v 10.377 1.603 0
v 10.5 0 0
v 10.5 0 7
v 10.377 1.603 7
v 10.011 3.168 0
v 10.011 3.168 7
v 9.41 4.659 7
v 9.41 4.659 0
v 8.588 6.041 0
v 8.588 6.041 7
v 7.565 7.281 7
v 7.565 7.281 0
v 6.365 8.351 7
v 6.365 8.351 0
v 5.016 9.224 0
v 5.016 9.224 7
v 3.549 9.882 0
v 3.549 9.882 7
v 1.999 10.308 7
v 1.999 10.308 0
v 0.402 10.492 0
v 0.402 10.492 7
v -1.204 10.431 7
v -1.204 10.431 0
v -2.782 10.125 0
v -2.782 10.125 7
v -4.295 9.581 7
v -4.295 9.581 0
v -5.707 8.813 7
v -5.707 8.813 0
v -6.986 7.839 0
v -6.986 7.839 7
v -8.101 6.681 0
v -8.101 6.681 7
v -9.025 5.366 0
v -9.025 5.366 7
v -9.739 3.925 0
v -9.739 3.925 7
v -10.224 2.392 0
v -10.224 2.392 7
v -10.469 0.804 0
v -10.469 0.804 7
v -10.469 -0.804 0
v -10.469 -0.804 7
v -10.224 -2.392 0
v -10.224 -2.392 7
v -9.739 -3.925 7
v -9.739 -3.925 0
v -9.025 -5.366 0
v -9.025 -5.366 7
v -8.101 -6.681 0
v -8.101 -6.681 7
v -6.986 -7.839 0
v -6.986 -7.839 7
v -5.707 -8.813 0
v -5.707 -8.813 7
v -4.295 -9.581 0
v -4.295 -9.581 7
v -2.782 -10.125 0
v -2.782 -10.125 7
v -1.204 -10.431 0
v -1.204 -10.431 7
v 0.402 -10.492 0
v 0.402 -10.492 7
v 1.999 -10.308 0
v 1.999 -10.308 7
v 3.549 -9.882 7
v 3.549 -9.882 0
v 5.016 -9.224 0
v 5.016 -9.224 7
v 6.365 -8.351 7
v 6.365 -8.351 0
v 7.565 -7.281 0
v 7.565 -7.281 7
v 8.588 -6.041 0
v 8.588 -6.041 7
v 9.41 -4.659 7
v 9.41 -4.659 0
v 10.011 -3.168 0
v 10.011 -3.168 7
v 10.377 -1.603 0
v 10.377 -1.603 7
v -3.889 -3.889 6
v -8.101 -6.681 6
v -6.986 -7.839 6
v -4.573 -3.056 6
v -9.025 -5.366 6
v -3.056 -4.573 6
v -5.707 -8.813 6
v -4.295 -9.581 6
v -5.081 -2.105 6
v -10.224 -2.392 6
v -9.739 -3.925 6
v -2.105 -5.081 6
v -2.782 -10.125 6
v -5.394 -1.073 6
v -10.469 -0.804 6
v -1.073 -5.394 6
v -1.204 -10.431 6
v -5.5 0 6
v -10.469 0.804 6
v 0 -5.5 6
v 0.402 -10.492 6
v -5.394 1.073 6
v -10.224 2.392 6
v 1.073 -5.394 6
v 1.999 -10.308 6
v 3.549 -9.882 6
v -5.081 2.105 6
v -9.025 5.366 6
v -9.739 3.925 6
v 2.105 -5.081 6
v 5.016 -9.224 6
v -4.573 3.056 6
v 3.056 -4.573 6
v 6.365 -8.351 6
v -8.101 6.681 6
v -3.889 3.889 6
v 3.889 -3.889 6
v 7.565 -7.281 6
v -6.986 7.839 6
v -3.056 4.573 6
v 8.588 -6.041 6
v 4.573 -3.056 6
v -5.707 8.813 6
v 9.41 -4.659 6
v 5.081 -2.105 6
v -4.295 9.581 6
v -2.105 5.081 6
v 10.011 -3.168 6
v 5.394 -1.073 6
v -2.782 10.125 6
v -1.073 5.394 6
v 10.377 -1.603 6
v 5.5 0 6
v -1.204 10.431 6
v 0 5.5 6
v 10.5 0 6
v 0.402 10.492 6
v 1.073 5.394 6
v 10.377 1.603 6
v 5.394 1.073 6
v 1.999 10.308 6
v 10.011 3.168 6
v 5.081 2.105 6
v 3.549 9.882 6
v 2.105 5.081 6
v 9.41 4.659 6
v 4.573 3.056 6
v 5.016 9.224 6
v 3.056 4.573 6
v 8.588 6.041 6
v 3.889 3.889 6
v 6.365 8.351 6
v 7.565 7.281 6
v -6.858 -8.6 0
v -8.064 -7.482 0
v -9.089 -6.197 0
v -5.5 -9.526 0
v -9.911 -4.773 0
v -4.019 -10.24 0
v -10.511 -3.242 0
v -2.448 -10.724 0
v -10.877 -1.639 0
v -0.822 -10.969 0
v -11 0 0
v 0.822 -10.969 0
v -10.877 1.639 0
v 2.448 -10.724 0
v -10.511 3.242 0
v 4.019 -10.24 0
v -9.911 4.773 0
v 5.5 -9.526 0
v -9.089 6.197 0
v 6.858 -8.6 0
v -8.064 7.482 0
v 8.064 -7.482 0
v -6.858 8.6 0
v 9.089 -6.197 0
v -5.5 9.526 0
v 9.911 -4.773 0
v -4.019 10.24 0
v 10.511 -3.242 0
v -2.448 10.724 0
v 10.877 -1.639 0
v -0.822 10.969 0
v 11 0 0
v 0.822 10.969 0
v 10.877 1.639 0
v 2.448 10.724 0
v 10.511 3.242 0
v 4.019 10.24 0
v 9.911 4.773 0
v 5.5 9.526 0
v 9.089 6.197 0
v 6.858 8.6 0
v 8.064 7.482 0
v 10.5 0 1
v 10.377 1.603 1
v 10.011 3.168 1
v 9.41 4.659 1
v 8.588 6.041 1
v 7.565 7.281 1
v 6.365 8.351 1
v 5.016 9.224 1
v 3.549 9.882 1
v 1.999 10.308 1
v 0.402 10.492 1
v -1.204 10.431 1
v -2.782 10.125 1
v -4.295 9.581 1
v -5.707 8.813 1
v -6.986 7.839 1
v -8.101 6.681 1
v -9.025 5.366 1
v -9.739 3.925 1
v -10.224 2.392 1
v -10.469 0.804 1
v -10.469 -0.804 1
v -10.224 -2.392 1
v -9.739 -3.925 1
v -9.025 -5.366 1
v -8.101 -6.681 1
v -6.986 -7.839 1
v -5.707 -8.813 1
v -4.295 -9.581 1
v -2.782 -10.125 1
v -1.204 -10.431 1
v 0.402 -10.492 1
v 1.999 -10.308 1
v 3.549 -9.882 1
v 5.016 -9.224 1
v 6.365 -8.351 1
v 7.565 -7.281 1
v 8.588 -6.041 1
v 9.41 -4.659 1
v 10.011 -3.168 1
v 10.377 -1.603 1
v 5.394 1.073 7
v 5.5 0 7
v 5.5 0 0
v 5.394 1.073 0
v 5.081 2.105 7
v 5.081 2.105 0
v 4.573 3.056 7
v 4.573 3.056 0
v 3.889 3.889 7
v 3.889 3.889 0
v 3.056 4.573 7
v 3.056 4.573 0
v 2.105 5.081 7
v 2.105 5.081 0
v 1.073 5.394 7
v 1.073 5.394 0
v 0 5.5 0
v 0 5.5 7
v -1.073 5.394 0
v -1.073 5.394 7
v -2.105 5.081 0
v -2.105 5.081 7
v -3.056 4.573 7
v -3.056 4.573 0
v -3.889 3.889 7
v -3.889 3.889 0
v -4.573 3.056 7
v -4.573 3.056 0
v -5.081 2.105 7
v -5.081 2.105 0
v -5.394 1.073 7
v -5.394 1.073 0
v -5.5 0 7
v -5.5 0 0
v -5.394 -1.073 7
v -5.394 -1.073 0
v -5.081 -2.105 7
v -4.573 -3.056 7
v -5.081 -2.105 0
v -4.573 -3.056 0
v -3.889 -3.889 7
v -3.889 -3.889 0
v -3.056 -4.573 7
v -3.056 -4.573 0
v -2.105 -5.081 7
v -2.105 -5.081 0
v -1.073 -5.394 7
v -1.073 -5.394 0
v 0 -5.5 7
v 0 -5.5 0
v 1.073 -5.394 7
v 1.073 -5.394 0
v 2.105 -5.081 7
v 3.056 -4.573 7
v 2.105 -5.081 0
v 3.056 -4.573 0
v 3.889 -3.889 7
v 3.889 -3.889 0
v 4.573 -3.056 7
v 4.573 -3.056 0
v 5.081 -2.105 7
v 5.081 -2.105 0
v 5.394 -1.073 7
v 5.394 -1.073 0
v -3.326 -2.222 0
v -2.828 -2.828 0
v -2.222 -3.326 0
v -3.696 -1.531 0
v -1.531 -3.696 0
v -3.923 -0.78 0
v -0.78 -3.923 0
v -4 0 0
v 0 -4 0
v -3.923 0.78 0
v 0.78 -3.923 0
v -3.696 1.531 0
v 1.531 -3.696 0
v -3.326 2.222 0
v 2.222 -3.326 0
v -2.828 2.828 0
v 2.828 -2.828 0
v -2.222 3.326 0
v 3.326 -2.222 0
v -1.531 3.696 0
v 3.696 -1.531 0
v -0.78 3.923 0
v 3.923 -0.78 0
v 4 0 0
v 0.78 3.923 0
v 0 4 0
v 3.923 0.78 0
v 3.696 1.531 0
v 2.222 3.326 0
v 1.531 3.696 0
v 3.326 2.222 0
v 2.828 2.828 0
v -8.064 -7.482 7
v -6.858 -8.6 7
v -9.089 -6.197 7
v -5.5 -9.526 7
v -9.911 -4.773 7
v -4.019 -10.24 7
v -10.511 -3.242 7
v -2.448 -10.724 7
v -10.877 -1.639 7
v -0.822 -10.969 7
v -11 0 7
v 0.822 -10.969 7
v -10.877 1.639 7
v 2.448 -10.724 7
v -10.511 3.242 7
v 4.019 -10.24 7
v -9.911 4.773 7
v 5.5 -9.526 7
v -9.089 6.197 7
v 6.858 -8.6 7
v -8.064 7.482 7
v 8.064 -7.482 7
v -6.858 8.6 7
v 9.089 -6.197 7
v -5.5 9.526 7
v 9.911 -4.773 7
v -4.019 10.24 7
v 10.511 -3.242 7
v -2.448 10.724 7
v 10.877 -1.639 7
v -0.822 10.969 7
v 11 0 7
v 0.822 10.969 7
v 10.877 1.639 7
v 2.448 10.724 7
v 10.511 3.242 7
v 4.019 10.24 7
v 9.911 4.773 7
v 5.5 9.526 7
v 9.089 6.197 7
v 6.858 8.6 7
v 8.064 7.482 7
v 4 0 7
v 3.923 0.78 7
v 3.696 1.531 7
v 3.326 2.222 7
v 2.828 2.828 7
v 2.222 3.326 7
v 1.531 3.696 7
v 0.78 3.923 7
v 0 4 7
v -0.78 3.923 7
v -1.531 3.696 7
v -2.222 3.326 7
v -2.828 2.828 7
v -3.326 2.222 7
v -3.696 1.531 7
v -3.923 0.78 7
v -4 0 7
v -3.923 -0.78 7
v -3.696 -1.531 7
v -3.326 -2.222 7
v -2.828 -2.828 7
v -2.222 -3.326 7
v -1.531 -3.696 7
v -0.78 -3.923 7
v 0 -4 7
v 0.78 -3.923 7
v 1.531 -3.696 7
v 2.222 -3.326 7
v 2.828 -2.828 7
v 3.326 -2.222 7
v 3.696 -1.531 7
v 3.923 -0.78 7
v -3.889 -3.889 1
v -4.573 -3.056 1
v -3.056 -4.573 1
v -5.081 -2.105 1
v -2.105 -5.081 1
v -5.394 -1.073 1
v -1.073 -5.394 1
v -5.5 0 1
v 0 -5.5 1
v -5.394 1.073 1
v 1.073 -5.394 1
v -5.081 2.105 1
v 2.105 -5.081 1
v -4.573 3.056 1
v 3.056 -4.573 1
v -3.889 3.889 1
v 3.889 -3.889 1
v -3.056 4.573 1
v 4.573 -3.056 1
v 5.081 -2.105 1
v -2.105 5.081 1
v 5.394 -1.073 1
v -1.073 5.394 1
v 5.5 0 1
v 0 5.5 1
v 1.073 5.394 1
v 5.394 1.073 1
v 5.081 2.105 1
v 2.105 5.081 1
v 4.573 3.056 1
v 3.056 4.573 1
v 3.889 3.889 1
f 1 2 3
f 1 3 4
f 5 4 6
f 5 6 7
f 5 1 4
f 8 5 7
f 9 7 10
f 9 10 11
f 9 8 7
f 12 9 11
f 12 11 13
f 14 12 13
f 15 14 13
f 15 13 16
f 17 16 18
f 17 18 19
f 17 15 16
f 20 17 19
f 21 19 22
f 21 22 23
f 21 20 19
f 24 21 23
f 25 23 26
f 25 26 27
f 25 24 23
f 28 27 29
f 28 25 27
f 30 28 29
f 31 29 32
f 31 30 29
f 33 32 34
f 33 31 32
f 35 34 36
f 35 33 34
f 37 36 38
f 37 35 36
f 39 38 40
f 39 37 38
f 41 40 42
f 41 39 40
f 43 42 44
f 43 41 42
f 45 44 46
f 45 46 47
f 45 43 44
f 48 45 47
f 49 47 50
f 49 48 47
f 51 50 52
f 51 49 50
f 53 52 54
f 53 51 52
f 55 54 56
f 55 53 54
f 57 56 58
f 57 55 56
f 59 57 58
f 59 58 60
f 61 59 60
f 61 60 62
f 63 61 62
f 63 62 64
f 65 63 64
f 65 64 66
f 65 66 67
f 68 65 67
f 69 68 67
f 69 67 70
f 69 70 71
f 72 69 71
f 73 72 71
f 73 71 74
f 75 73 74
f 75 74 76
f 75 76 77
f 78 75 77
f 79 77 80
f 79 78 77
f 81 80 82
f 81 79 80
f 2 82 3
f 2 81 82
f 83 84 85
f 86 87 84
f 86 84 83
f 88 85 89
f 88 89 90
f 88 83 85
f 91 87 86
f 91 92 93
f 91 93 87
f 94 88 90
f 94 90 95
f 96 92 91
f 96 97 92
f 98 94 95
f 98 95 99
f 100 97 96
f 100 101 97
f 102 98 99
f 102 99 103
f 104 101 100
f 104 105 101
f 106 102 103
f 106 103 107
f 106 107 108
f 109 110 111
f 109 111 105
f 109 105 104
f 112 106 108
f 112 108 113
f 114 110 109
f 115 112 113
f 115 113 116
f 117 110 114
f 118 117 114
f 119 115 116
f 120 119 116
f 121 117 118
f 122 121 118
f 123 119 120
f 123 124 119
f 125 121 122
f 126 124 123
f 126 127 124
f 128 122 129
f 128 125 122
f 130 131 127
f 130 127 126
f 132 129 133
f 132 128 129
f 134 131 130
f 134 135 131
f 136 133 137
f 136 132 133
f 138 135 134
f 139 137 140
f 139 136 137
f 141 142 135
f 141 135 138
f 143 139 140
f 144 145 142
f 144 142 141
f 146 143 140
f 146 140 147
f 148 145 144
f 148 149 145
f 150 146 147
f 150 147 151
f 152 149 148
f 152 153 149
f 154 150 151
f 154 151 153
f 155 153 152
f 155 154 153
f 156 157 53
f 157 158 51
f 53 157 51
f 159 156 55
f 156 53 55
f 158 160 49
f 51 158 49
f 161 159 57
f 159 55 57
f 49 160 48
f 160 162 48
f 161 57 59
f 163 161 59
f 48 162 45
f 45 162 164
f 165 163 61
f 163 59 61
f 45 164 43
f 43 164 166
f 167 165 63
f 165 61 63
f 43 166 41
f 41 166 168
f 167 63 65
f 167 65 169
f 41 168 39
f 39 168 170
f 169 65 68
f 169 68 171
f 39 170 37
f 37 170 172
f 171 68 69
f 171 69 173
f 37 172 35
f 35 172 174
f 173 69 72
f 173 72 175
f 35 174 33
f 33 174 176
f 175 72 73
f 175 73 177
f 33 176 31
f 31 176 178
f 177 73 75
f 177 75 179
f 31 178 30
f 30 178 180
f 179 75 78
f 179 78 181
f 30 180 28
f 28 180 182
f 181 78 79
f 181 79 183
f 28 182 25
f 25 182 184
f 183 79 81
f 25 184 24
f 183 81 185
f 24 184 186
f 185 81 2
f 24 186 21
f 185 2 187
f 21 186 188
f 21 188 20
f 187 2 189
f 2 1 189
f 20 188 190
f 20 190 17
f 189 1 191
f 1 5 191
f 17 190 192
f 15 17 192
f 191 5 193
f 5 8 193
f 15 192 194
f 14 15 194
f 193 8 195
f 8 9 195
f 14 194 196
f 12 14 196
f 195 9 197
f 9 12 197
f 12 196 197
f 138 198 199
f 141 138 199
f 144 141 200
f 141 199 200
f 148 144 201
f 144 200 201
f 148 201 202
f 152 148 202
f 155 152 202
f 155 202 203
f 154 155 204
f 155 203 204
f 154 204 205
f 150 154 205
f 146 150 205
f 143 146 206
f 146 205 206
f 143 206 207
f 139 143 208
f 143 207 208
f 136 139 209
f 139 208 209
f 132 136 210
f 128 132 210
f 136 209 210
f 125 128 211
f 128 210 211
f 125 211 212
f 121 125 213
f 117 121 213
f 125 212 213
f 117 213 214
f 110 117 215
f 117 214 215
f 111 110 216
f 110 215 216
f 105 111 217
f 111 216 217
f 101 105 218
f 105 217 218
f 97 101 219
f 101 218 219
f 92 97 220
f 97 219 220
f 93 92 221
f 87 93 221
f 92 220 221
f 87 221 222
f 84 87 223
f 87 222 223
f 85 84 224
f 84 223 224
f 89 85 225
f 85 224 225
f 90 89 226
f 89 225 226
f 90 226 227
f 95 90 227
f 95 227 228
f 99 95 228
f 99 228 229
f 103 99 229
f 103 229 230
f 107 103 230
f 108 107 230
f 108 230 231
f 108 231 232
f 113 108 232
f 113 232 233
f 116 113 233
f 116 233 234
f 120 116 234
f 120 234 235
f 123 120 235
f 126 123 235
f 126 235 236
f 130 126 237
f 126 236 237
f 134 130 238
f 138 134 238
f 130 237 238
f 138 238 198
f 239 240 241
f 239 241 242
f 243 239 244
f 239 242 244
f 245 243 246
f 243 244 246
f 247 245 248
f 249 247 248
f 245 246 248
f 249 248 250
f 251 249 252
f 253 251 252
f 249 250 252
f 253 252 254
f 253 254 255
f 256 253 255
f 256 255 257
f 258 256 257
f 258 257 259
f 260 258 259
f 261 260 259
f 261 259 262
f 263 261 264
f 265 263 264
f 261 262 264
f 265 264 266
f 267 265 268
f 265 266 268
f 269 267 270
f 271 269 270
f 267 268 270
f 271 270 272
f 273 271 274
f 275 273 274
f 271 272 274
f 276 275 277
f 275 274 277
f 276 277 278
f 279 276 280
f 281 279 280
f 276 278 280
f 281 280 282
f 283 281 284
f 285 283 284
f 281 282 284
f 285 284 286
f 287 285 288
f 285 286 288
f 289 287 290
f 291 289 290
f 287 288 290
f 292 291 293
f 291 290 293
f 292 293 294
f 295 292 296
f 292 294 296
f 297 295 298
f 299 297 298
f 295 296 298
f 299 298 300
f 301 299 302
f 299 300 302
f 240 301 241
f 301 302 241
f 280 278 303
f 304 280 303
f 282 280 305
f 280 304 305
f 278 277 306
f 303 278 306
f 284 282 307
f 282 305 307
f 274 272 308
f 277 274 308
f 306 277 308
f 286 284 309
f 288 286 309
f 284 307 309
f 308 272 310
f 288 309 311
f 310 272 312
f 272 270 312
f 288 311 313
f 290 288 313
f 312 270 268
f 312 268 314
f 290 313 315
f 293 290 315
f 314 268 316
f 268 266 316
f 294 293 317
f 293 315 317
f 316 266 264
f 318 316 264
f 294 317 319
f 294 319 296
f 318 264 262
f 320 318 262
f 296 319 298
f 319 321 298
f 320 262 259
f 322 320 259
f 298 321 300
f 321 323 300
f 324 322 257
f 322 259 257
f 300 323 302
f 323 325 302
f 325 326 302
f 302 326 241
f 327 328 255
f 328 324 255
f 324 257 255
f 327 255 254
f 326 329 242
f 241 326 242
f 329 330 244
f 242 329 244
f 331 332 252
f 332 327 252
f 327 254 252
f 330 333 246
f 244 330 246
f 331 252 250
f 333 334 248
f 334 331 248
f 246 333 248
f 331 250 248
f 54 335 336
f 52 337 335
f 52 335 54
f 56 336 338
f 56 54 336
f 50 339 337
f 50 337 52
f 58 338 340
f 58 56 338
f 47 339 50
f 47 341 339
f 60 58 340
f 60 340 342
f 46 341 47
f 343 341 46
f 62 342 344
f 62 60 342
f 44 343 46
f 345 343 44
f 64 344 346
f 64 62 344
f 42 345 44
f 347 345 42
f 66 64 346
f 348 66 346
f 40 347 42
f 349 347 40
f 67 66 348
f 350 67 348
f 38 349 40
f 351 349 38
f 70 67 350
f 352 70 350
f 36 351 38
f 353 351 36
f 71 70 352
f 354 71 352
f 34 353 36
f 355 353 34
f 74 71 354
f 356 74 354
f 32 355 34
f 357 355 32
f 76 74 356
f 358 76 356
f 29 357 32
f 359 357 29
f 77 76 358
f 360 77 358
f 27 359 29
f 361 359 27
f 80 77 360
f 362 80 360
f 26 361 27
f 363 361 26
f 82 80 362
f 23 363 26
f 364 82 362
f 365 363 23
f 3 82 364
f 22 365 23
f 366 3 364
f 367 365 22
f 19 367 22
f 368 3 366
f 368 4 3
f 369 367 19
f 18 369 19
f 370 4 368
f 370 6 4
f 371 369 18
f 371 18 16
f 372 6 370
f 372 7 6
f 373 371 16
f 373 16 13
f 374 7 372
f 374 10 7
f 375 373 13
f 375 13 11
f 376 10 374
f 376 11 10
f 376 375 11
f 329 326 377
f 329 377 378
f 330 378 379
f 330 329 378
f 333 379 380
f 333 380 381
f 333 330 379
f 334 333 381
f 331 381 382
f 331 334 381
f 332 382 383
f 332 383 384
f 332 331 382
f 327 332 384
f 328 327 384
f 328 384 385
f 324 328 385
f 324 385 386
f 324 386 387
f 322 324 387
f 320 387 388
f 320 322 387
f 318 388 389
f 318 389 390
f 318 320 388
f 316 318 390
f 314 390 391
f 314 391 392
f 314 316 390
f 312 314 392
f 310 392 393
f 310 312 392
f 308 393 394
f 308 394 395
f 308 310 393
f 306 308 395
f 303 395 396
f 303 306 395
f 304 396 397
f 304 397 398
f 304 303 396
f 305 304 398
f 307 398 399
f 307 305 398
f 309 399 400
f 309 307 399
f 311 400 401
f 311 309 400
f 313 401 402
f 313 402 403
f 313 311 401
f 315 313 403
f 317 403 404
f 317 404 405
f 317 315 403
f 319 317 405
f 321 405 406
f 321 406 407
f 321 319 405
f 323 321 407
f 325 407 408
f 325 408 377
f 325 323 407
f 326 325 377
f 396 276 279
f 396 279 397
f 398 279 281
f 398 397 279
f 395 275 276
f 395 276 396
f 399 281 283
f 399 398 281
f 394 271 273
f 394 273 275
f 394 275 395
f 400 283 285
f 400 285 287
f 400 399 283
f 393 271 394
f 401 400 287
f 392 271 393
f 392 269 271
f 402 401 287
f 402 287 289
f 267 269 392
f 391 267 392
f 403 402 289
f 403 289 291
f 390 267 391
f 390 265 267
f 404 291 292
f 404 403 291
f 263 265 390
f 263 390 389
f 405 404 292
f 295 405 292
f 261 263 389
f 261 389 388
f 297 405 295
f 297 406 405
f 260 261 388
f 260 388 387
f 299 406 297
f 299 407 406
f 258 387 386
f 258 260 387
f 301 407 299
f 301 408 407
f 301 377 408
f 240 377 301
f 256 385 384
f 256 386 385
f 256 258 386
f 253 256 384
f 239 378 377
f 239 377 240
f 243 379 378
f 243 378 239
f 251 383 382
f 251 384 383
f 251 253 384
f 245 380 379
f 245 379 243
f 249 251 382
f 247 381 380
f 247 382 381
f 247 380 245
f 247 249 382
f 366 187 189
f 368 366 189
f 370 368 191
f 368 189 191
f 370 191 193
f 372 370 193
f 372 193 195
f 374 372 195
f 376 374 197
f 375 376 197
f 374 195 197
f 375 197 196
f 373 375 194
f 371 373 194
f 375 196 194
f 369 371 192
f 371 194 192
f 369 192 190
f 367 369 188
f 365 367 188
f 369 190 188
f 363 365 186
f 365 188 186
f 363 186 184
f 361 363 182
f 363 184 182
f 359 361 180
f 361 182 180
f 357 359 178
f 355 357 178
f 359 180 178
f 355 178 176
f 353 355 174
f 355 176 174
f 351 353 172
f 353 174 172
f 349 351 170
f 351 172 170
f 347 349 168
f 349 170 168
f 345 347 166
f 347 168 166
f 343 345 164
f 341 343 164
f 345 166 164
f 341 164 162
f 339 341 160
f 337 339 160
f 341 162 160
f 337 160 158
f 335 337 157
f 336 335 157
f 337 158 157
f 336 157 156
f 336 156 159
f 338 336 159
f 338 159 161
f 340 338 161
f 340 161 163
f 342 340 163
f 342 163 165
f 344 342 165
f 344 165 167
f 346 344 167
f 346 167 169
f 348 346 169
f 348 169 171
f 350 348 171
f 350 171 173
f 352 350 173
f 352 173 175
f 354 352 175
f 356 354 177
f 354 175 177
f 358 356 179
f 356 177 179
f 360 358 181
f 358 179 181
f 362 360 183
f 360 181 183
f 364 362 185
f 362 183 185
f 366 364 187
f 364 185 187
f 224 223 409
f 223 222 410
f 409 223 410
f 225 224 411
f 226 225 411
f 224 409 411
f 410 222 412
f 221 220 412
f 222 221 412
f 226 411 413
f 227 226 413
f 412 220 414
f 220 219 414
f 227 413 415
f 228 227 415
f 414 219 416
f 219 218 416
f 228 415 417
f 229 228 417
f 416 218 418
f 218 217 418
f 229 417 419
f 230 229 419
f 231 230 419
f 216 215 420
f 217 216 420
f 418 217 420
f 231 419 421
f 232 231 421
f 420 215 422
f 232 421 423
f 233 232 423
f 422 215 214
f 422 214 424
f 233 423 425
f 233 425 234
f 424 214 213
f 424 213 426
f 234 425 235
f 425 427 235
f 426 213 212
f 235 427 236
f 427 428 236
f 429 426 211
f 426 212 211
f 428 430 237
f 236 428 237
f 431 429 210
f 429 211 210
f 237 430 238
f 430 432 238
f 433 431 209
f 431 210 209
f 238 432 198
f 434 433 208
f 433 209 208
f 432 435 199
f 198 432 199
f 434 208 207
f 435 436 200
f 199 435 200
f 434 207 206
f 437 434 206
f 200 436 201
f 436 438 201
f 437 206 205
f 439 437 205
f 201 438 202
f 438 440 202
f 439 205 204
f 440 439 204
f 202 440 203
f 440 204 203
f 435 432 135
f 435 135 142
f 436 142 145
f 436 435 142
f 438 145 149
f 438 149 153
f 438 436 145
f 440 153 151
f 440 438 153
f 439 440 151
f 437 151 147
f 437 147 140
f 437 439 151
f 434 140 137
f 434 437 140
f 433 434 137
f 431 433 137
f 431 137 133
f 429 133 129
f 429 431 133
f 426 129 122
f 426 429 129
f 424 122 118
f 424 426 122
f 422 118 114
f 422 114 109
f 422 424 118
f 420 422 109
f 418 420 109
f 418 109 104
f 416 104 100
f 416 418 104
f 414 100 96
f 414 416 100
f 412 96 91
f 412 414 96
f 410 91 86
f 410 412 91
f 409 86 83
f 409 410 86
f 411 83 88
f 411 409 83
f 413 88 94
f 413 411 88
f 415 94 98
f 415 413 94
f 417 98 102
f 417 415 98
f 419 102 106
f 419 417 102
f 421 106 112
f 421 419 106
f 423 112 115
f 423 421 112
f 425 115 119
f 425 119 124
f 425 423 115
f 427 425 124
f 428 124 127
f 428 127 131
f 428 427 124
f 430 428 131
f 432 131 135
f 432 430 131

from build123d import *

# Parameters (mm, degrees)
F0_R     = 5.5
F0_R_2   = 4
F1_DEPTH = 7
F0_R_3   = 11
F0_R_4   = 10.5
F2_DEPTH = 5


with BuildPart() as f1:
    # F0 (on Top) → F1 (new body)
    with BuildSketch(Plane.XY):
        Circle(F0_R)
        Circle(F0_R_2, mode=Mode.SUBTRACT)
    extrude(amount=F1_DEPTH)


with BuildPart() as f1b:
    # F0 (on Top) → F1, piece 2 (new body)
    with BuildSketch(Plane.XY):
        Circle(F0_R_3)
        Circle(F0_R_4, mode=Mode.SUBTRACT)
    extrude(amount=F1_DEPTH)


with BuildPart() as f2:
    # F0 (on Top) → F2 (new body)
    with BuildSketch(Plane.XY):
        Circle(F0_R_4)
        Circle(F0_R, mode=Mode.SUBTRACT)
    extrude(amount=F2_DEPTH)


with BuildPart() as f2_1:
    # F3: moved
    add(f2.part.moved(Location((0, 0, 1))))


solid = Compound([f1.part, f1b.part, f2_1.part])
